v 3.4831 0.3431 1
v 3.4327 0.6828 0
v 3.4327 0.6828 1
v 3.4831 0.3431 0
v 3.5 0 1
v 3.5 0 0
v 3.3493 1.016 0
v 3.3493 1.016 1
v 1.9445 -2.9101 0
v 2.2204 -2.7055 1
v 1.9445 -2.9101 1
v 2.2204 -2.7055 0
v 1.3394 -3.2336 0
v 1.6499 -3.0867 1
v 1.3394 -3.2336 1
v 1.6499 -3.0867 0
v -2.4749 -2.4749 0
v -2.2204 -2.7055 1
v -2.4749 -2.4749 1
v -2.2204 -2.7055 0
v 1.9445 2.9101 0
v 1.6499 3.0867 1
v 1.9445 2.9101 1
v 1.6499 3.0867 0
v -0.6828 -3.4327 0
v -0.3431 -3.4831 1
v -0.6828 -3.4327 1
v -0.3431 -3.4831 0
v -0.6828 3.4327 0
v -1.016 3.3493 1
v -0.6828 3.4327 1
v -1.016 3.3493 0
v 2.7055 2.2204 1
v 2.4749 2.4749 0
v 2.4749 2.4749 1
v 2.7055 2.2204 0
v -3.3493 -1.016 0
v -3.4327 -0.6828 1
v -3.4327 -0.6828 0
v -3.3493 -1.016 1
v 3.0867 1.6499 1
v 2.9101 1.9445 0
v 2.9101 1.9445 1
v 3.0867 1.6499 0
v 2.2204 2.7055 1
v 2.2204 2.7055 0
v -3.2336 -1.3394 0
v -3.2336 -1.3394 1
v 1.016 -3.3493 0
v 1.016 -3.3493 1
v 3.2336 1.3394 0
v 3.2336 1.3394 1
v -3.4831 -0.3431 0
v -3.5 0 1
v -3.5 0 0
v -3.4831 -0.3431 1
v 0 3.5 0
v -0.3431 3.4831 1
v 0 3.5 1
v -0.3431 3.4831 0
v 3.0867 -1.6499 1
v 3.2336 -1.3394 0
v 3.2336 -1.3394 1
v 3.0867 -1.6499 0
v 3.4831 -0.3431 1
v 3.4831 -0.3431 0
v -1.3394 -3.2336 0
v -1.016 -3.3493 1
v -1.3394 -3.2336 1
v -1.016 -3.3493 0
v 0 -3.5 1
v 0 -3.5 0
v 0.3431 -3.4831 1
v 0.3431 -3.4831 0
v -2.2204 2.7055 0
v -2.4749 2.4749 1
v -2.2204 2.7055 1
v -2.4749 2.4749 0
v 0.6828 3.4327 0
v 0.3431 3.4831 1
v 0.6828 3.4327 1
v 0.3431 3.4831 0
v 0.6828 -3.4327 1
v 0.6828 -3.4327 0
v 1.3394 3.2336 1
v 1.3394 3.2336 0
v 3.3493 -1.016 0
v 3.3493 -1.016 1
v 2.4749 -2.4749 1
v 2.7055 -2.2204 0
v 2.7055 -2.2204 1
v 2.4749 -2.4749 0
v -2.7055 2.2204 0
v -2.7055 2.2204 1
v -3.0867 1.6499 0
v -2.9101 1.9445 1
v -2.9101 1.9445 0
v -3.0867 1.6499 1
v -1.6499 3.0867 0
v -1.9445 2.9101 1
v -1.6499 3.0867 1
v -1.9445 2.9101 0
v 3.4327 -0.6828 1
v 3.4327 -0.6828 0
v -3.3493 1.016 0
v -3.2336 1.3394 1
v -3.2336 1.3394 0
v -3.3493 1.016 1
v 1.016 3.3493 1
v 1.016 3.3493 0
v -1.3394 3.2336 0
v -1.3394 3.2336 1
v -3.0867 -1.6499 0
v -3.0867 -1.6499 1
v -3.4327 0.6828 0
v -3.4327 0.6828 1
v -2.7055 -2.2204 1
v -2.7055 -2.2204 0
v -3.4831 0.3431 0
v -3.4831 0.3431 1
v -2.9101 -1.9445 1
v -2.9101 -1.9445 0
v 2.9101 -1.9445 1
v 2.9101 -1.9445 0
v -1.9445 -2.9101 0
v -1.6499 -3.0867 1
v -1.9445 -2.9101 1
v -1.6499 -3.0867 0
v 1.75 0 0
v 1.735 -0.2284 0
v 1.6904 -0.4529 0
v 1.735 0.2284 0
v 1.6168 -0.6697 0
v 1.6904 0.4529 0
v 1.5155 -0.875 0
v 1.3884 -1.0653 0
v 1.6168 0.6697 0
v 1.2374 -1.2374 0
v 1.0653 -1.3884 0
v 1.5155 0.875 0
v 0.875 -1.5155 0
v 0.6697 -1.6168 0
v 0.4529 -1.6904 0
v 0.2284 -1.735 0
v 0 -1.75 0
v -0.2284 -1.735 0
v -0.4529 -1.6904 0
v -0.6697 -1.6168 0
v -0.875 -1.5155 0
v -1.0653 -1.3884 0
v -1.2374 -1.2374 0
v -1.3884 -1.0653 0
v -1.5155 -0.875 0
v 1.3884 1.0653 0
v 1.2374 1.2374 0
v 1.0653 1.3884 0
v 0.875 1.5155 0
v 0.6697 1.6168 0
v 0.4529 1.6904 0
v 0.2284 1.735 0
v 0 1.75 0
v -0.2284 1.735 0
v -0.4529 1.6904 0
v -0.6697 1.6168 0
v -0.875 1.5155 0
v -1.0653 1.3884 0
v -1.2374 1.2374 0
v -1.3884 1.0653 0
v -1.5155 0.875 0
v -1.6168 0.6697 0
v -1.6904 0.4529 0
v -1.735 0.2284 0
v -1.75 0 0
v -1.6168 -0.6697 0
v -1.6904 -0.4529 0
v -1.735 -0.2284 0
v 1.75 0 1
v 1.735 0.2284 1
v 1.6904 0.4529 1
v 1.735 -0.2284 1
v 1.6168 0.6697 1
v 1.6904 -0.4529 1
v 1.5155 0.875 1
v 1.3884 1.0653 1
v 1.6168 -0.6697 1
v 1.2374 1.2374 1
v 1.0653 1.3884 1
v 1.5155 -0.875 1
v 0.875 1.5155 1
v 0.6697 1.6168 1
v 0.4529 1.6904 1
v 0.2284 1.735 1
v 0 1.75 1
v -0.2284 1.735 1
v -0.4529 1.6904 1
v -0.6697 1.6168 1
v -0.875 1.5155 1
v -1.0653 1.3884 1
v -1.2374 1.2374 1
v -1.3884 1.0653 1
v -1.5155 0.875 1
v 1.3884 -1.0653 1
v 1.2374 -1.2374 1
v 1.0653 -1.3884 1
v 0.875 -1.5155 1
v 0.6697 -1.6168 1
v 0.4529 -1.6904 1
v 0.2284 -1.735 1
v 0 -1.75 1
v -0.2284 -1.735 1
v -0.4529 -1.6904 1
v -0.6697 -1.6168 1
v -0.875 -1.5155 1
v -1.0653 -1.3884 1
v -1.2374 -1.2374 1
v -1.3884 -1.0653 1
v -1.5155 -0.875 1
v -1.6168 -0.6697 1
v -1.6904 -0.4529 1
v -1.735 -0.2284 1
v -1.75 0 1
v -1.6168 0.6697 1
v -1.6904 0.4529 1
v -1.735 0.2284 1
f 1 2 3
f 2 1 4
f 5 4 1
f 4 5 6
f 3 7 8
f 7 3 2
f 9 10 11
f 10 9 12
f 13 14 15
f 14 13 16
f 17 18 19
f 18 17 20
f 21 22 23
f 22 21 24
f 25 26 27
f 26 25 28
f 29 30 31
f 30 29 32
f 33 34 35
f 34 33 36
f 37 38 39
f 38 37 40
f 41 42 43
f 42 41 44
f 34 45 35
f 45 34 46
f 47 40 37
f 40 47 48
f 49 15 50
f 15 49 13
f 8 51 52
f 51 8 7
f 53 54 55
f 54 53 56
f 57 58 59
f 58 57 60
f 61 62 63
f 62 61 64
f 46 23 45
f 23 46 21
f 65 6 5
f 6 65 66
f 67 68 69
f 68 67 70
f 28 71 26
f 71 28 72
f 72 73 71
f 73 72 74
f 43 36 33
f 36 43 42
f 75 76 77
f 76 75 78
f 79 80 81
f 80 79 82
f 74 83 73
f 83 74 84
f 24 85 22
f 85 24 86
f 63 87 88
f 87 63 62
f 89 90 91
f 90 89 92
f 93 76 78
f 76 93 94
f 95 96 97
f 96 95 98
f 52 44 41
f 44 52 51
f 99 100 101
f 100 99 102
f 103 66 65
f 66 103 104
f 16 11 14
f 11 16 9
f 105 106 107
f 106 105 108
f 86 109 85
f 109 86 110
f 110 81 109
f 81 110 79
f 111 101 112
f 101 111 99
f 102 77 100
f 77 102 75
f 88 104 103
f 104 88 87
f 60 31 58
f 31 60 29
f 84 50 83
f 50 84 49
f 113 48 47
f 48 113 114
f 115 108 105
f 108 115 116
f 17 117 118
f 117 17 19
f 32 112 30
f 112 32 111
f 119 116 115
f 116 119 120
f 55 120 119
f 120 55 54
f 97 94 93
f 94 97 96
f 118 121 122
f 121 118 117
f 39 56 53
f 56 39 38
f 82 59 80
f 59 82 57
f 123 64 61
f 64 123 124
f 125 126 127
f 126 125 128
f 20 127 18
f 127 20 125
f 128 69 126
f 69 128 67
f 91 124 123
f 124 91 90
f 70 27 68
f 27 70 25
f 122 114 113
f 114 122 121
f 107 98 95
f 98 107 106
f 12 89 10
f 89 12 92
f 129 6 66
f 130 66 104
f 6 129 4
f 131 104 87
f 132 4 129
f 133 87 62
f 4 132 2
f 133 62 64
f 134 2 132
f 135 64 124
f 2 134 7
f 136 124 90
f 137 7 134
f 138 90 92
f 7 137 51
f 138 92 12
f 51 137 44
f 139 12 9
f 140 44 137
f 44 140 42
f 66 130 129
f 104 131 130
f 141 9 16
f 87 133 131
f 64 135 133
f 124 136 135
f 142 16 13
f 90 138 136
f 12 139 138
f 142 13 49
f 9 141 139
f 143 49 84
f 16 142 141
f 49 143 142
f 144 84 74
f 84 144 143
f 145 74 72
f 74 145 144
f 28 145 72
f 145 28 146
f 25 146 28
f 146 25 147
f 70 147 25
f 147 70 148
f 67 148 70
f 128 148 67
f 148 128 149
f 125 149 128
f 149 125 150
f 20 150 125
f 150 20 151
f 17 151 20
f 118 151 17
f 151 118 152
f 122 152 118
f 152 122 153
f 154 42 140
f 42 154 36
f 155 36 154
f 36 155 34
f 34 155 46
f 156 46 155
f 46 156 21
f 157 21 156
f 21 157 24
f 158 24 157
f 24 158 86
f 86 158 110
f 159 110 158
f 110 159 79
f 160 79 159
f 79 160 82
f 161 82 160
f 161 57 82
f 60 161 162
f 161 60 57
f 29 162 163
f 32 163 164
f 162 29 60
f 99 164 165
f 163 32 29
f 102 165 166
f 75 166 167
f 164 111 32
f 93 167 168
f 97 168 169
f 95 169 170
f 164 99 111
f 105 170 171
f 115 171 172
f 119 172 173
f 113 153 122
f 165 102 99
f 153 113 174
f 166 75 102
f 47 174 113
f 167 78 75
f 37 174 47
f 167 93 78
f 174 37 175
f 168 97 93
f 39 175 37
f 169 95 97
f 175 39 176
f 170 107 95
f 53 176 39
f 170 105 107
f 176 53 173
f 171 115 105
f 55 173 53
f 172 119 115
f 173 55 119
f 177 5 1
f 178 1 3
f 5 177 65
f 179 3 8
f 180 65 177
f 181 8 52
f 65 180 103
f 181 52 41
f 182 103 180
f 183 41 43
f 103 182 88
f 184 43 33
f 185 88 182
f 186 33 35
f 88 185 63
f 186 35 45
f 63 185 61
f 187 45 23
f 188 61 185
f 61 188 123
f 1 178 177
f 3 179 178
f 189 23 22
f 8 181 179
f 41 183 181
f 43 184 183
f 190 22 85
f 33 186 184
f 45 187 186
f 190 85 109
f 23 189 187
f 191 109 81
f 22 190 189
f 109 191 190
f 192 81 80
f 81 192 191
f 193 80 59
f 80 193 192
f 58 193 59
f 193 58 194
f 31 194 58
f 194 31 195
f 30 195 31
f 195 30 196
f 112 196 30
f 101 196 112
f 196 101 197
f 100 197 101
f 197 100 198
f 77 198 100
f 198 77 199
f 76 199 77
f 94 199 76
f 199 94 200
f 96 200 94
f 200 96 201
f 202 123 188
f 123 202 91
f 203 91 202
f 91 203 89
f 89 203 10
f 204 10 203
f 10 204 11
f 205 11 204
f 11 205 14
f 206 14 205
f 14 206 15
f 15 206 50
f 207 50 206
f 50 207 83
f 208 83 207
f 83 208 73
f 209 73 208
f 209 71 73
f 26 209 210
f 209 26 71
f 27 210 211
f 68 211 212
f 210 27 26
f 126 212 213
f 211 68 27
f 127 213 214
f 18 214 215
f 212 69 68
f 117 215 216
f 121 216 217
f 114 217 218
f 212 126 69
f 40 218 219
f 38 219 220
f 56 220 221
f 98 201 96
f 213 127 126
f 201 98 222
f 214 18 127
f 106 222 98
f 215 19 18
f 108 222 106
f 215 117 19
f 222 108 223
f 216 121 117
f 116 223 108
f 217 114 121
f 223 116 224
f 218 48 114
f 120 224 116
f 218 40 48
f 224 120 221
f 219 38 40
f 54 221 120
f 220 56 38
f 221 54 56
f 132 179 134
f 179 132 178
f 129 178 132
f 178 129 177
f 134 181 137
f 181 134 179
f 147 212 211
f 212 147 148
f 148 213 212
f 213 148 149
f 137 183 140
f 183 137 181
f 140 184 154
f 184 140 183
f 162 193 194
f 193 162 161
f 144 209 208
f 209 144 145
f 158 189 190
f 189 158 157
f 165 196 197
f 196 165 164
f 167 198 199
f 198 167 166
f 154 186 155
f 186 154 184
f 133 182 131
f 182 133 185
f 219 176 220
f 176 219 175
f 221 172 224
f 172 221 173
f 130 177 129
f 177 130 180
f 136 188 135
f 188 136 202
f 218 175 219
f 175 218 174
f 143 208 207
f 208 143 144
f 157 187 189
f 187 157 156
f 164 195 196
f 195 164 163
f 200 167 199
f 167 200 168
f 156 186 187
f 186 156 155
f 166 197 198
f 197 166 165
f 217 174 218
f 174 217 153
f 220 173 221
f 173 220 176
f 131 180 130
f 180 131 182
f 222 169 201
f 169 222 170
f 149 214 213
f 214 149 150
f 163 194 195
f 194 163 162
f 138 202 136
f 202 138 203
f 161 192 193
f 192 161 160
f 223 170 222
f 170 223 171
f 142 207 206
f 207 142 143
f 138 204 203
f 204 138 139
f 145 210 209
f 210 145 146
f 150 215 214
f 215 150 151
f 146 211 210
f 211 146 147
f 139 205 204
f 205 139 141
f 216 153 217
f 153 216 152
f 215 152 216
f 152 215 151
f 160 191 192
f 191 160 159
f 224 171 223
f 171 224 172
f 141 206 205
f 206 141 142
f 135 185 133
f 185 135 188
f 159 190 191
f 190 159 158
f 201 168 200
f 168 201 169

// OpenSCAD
// unterlagsscheibe (washer): OD 7, ID 3.5, 1 mm thick
difference() {
    cylinder(d = 7, h = 1, $fn = 64);
    translate([0, 0, -1]) cylinder(d = 3.5, h = 3, $fn = 48);
}
